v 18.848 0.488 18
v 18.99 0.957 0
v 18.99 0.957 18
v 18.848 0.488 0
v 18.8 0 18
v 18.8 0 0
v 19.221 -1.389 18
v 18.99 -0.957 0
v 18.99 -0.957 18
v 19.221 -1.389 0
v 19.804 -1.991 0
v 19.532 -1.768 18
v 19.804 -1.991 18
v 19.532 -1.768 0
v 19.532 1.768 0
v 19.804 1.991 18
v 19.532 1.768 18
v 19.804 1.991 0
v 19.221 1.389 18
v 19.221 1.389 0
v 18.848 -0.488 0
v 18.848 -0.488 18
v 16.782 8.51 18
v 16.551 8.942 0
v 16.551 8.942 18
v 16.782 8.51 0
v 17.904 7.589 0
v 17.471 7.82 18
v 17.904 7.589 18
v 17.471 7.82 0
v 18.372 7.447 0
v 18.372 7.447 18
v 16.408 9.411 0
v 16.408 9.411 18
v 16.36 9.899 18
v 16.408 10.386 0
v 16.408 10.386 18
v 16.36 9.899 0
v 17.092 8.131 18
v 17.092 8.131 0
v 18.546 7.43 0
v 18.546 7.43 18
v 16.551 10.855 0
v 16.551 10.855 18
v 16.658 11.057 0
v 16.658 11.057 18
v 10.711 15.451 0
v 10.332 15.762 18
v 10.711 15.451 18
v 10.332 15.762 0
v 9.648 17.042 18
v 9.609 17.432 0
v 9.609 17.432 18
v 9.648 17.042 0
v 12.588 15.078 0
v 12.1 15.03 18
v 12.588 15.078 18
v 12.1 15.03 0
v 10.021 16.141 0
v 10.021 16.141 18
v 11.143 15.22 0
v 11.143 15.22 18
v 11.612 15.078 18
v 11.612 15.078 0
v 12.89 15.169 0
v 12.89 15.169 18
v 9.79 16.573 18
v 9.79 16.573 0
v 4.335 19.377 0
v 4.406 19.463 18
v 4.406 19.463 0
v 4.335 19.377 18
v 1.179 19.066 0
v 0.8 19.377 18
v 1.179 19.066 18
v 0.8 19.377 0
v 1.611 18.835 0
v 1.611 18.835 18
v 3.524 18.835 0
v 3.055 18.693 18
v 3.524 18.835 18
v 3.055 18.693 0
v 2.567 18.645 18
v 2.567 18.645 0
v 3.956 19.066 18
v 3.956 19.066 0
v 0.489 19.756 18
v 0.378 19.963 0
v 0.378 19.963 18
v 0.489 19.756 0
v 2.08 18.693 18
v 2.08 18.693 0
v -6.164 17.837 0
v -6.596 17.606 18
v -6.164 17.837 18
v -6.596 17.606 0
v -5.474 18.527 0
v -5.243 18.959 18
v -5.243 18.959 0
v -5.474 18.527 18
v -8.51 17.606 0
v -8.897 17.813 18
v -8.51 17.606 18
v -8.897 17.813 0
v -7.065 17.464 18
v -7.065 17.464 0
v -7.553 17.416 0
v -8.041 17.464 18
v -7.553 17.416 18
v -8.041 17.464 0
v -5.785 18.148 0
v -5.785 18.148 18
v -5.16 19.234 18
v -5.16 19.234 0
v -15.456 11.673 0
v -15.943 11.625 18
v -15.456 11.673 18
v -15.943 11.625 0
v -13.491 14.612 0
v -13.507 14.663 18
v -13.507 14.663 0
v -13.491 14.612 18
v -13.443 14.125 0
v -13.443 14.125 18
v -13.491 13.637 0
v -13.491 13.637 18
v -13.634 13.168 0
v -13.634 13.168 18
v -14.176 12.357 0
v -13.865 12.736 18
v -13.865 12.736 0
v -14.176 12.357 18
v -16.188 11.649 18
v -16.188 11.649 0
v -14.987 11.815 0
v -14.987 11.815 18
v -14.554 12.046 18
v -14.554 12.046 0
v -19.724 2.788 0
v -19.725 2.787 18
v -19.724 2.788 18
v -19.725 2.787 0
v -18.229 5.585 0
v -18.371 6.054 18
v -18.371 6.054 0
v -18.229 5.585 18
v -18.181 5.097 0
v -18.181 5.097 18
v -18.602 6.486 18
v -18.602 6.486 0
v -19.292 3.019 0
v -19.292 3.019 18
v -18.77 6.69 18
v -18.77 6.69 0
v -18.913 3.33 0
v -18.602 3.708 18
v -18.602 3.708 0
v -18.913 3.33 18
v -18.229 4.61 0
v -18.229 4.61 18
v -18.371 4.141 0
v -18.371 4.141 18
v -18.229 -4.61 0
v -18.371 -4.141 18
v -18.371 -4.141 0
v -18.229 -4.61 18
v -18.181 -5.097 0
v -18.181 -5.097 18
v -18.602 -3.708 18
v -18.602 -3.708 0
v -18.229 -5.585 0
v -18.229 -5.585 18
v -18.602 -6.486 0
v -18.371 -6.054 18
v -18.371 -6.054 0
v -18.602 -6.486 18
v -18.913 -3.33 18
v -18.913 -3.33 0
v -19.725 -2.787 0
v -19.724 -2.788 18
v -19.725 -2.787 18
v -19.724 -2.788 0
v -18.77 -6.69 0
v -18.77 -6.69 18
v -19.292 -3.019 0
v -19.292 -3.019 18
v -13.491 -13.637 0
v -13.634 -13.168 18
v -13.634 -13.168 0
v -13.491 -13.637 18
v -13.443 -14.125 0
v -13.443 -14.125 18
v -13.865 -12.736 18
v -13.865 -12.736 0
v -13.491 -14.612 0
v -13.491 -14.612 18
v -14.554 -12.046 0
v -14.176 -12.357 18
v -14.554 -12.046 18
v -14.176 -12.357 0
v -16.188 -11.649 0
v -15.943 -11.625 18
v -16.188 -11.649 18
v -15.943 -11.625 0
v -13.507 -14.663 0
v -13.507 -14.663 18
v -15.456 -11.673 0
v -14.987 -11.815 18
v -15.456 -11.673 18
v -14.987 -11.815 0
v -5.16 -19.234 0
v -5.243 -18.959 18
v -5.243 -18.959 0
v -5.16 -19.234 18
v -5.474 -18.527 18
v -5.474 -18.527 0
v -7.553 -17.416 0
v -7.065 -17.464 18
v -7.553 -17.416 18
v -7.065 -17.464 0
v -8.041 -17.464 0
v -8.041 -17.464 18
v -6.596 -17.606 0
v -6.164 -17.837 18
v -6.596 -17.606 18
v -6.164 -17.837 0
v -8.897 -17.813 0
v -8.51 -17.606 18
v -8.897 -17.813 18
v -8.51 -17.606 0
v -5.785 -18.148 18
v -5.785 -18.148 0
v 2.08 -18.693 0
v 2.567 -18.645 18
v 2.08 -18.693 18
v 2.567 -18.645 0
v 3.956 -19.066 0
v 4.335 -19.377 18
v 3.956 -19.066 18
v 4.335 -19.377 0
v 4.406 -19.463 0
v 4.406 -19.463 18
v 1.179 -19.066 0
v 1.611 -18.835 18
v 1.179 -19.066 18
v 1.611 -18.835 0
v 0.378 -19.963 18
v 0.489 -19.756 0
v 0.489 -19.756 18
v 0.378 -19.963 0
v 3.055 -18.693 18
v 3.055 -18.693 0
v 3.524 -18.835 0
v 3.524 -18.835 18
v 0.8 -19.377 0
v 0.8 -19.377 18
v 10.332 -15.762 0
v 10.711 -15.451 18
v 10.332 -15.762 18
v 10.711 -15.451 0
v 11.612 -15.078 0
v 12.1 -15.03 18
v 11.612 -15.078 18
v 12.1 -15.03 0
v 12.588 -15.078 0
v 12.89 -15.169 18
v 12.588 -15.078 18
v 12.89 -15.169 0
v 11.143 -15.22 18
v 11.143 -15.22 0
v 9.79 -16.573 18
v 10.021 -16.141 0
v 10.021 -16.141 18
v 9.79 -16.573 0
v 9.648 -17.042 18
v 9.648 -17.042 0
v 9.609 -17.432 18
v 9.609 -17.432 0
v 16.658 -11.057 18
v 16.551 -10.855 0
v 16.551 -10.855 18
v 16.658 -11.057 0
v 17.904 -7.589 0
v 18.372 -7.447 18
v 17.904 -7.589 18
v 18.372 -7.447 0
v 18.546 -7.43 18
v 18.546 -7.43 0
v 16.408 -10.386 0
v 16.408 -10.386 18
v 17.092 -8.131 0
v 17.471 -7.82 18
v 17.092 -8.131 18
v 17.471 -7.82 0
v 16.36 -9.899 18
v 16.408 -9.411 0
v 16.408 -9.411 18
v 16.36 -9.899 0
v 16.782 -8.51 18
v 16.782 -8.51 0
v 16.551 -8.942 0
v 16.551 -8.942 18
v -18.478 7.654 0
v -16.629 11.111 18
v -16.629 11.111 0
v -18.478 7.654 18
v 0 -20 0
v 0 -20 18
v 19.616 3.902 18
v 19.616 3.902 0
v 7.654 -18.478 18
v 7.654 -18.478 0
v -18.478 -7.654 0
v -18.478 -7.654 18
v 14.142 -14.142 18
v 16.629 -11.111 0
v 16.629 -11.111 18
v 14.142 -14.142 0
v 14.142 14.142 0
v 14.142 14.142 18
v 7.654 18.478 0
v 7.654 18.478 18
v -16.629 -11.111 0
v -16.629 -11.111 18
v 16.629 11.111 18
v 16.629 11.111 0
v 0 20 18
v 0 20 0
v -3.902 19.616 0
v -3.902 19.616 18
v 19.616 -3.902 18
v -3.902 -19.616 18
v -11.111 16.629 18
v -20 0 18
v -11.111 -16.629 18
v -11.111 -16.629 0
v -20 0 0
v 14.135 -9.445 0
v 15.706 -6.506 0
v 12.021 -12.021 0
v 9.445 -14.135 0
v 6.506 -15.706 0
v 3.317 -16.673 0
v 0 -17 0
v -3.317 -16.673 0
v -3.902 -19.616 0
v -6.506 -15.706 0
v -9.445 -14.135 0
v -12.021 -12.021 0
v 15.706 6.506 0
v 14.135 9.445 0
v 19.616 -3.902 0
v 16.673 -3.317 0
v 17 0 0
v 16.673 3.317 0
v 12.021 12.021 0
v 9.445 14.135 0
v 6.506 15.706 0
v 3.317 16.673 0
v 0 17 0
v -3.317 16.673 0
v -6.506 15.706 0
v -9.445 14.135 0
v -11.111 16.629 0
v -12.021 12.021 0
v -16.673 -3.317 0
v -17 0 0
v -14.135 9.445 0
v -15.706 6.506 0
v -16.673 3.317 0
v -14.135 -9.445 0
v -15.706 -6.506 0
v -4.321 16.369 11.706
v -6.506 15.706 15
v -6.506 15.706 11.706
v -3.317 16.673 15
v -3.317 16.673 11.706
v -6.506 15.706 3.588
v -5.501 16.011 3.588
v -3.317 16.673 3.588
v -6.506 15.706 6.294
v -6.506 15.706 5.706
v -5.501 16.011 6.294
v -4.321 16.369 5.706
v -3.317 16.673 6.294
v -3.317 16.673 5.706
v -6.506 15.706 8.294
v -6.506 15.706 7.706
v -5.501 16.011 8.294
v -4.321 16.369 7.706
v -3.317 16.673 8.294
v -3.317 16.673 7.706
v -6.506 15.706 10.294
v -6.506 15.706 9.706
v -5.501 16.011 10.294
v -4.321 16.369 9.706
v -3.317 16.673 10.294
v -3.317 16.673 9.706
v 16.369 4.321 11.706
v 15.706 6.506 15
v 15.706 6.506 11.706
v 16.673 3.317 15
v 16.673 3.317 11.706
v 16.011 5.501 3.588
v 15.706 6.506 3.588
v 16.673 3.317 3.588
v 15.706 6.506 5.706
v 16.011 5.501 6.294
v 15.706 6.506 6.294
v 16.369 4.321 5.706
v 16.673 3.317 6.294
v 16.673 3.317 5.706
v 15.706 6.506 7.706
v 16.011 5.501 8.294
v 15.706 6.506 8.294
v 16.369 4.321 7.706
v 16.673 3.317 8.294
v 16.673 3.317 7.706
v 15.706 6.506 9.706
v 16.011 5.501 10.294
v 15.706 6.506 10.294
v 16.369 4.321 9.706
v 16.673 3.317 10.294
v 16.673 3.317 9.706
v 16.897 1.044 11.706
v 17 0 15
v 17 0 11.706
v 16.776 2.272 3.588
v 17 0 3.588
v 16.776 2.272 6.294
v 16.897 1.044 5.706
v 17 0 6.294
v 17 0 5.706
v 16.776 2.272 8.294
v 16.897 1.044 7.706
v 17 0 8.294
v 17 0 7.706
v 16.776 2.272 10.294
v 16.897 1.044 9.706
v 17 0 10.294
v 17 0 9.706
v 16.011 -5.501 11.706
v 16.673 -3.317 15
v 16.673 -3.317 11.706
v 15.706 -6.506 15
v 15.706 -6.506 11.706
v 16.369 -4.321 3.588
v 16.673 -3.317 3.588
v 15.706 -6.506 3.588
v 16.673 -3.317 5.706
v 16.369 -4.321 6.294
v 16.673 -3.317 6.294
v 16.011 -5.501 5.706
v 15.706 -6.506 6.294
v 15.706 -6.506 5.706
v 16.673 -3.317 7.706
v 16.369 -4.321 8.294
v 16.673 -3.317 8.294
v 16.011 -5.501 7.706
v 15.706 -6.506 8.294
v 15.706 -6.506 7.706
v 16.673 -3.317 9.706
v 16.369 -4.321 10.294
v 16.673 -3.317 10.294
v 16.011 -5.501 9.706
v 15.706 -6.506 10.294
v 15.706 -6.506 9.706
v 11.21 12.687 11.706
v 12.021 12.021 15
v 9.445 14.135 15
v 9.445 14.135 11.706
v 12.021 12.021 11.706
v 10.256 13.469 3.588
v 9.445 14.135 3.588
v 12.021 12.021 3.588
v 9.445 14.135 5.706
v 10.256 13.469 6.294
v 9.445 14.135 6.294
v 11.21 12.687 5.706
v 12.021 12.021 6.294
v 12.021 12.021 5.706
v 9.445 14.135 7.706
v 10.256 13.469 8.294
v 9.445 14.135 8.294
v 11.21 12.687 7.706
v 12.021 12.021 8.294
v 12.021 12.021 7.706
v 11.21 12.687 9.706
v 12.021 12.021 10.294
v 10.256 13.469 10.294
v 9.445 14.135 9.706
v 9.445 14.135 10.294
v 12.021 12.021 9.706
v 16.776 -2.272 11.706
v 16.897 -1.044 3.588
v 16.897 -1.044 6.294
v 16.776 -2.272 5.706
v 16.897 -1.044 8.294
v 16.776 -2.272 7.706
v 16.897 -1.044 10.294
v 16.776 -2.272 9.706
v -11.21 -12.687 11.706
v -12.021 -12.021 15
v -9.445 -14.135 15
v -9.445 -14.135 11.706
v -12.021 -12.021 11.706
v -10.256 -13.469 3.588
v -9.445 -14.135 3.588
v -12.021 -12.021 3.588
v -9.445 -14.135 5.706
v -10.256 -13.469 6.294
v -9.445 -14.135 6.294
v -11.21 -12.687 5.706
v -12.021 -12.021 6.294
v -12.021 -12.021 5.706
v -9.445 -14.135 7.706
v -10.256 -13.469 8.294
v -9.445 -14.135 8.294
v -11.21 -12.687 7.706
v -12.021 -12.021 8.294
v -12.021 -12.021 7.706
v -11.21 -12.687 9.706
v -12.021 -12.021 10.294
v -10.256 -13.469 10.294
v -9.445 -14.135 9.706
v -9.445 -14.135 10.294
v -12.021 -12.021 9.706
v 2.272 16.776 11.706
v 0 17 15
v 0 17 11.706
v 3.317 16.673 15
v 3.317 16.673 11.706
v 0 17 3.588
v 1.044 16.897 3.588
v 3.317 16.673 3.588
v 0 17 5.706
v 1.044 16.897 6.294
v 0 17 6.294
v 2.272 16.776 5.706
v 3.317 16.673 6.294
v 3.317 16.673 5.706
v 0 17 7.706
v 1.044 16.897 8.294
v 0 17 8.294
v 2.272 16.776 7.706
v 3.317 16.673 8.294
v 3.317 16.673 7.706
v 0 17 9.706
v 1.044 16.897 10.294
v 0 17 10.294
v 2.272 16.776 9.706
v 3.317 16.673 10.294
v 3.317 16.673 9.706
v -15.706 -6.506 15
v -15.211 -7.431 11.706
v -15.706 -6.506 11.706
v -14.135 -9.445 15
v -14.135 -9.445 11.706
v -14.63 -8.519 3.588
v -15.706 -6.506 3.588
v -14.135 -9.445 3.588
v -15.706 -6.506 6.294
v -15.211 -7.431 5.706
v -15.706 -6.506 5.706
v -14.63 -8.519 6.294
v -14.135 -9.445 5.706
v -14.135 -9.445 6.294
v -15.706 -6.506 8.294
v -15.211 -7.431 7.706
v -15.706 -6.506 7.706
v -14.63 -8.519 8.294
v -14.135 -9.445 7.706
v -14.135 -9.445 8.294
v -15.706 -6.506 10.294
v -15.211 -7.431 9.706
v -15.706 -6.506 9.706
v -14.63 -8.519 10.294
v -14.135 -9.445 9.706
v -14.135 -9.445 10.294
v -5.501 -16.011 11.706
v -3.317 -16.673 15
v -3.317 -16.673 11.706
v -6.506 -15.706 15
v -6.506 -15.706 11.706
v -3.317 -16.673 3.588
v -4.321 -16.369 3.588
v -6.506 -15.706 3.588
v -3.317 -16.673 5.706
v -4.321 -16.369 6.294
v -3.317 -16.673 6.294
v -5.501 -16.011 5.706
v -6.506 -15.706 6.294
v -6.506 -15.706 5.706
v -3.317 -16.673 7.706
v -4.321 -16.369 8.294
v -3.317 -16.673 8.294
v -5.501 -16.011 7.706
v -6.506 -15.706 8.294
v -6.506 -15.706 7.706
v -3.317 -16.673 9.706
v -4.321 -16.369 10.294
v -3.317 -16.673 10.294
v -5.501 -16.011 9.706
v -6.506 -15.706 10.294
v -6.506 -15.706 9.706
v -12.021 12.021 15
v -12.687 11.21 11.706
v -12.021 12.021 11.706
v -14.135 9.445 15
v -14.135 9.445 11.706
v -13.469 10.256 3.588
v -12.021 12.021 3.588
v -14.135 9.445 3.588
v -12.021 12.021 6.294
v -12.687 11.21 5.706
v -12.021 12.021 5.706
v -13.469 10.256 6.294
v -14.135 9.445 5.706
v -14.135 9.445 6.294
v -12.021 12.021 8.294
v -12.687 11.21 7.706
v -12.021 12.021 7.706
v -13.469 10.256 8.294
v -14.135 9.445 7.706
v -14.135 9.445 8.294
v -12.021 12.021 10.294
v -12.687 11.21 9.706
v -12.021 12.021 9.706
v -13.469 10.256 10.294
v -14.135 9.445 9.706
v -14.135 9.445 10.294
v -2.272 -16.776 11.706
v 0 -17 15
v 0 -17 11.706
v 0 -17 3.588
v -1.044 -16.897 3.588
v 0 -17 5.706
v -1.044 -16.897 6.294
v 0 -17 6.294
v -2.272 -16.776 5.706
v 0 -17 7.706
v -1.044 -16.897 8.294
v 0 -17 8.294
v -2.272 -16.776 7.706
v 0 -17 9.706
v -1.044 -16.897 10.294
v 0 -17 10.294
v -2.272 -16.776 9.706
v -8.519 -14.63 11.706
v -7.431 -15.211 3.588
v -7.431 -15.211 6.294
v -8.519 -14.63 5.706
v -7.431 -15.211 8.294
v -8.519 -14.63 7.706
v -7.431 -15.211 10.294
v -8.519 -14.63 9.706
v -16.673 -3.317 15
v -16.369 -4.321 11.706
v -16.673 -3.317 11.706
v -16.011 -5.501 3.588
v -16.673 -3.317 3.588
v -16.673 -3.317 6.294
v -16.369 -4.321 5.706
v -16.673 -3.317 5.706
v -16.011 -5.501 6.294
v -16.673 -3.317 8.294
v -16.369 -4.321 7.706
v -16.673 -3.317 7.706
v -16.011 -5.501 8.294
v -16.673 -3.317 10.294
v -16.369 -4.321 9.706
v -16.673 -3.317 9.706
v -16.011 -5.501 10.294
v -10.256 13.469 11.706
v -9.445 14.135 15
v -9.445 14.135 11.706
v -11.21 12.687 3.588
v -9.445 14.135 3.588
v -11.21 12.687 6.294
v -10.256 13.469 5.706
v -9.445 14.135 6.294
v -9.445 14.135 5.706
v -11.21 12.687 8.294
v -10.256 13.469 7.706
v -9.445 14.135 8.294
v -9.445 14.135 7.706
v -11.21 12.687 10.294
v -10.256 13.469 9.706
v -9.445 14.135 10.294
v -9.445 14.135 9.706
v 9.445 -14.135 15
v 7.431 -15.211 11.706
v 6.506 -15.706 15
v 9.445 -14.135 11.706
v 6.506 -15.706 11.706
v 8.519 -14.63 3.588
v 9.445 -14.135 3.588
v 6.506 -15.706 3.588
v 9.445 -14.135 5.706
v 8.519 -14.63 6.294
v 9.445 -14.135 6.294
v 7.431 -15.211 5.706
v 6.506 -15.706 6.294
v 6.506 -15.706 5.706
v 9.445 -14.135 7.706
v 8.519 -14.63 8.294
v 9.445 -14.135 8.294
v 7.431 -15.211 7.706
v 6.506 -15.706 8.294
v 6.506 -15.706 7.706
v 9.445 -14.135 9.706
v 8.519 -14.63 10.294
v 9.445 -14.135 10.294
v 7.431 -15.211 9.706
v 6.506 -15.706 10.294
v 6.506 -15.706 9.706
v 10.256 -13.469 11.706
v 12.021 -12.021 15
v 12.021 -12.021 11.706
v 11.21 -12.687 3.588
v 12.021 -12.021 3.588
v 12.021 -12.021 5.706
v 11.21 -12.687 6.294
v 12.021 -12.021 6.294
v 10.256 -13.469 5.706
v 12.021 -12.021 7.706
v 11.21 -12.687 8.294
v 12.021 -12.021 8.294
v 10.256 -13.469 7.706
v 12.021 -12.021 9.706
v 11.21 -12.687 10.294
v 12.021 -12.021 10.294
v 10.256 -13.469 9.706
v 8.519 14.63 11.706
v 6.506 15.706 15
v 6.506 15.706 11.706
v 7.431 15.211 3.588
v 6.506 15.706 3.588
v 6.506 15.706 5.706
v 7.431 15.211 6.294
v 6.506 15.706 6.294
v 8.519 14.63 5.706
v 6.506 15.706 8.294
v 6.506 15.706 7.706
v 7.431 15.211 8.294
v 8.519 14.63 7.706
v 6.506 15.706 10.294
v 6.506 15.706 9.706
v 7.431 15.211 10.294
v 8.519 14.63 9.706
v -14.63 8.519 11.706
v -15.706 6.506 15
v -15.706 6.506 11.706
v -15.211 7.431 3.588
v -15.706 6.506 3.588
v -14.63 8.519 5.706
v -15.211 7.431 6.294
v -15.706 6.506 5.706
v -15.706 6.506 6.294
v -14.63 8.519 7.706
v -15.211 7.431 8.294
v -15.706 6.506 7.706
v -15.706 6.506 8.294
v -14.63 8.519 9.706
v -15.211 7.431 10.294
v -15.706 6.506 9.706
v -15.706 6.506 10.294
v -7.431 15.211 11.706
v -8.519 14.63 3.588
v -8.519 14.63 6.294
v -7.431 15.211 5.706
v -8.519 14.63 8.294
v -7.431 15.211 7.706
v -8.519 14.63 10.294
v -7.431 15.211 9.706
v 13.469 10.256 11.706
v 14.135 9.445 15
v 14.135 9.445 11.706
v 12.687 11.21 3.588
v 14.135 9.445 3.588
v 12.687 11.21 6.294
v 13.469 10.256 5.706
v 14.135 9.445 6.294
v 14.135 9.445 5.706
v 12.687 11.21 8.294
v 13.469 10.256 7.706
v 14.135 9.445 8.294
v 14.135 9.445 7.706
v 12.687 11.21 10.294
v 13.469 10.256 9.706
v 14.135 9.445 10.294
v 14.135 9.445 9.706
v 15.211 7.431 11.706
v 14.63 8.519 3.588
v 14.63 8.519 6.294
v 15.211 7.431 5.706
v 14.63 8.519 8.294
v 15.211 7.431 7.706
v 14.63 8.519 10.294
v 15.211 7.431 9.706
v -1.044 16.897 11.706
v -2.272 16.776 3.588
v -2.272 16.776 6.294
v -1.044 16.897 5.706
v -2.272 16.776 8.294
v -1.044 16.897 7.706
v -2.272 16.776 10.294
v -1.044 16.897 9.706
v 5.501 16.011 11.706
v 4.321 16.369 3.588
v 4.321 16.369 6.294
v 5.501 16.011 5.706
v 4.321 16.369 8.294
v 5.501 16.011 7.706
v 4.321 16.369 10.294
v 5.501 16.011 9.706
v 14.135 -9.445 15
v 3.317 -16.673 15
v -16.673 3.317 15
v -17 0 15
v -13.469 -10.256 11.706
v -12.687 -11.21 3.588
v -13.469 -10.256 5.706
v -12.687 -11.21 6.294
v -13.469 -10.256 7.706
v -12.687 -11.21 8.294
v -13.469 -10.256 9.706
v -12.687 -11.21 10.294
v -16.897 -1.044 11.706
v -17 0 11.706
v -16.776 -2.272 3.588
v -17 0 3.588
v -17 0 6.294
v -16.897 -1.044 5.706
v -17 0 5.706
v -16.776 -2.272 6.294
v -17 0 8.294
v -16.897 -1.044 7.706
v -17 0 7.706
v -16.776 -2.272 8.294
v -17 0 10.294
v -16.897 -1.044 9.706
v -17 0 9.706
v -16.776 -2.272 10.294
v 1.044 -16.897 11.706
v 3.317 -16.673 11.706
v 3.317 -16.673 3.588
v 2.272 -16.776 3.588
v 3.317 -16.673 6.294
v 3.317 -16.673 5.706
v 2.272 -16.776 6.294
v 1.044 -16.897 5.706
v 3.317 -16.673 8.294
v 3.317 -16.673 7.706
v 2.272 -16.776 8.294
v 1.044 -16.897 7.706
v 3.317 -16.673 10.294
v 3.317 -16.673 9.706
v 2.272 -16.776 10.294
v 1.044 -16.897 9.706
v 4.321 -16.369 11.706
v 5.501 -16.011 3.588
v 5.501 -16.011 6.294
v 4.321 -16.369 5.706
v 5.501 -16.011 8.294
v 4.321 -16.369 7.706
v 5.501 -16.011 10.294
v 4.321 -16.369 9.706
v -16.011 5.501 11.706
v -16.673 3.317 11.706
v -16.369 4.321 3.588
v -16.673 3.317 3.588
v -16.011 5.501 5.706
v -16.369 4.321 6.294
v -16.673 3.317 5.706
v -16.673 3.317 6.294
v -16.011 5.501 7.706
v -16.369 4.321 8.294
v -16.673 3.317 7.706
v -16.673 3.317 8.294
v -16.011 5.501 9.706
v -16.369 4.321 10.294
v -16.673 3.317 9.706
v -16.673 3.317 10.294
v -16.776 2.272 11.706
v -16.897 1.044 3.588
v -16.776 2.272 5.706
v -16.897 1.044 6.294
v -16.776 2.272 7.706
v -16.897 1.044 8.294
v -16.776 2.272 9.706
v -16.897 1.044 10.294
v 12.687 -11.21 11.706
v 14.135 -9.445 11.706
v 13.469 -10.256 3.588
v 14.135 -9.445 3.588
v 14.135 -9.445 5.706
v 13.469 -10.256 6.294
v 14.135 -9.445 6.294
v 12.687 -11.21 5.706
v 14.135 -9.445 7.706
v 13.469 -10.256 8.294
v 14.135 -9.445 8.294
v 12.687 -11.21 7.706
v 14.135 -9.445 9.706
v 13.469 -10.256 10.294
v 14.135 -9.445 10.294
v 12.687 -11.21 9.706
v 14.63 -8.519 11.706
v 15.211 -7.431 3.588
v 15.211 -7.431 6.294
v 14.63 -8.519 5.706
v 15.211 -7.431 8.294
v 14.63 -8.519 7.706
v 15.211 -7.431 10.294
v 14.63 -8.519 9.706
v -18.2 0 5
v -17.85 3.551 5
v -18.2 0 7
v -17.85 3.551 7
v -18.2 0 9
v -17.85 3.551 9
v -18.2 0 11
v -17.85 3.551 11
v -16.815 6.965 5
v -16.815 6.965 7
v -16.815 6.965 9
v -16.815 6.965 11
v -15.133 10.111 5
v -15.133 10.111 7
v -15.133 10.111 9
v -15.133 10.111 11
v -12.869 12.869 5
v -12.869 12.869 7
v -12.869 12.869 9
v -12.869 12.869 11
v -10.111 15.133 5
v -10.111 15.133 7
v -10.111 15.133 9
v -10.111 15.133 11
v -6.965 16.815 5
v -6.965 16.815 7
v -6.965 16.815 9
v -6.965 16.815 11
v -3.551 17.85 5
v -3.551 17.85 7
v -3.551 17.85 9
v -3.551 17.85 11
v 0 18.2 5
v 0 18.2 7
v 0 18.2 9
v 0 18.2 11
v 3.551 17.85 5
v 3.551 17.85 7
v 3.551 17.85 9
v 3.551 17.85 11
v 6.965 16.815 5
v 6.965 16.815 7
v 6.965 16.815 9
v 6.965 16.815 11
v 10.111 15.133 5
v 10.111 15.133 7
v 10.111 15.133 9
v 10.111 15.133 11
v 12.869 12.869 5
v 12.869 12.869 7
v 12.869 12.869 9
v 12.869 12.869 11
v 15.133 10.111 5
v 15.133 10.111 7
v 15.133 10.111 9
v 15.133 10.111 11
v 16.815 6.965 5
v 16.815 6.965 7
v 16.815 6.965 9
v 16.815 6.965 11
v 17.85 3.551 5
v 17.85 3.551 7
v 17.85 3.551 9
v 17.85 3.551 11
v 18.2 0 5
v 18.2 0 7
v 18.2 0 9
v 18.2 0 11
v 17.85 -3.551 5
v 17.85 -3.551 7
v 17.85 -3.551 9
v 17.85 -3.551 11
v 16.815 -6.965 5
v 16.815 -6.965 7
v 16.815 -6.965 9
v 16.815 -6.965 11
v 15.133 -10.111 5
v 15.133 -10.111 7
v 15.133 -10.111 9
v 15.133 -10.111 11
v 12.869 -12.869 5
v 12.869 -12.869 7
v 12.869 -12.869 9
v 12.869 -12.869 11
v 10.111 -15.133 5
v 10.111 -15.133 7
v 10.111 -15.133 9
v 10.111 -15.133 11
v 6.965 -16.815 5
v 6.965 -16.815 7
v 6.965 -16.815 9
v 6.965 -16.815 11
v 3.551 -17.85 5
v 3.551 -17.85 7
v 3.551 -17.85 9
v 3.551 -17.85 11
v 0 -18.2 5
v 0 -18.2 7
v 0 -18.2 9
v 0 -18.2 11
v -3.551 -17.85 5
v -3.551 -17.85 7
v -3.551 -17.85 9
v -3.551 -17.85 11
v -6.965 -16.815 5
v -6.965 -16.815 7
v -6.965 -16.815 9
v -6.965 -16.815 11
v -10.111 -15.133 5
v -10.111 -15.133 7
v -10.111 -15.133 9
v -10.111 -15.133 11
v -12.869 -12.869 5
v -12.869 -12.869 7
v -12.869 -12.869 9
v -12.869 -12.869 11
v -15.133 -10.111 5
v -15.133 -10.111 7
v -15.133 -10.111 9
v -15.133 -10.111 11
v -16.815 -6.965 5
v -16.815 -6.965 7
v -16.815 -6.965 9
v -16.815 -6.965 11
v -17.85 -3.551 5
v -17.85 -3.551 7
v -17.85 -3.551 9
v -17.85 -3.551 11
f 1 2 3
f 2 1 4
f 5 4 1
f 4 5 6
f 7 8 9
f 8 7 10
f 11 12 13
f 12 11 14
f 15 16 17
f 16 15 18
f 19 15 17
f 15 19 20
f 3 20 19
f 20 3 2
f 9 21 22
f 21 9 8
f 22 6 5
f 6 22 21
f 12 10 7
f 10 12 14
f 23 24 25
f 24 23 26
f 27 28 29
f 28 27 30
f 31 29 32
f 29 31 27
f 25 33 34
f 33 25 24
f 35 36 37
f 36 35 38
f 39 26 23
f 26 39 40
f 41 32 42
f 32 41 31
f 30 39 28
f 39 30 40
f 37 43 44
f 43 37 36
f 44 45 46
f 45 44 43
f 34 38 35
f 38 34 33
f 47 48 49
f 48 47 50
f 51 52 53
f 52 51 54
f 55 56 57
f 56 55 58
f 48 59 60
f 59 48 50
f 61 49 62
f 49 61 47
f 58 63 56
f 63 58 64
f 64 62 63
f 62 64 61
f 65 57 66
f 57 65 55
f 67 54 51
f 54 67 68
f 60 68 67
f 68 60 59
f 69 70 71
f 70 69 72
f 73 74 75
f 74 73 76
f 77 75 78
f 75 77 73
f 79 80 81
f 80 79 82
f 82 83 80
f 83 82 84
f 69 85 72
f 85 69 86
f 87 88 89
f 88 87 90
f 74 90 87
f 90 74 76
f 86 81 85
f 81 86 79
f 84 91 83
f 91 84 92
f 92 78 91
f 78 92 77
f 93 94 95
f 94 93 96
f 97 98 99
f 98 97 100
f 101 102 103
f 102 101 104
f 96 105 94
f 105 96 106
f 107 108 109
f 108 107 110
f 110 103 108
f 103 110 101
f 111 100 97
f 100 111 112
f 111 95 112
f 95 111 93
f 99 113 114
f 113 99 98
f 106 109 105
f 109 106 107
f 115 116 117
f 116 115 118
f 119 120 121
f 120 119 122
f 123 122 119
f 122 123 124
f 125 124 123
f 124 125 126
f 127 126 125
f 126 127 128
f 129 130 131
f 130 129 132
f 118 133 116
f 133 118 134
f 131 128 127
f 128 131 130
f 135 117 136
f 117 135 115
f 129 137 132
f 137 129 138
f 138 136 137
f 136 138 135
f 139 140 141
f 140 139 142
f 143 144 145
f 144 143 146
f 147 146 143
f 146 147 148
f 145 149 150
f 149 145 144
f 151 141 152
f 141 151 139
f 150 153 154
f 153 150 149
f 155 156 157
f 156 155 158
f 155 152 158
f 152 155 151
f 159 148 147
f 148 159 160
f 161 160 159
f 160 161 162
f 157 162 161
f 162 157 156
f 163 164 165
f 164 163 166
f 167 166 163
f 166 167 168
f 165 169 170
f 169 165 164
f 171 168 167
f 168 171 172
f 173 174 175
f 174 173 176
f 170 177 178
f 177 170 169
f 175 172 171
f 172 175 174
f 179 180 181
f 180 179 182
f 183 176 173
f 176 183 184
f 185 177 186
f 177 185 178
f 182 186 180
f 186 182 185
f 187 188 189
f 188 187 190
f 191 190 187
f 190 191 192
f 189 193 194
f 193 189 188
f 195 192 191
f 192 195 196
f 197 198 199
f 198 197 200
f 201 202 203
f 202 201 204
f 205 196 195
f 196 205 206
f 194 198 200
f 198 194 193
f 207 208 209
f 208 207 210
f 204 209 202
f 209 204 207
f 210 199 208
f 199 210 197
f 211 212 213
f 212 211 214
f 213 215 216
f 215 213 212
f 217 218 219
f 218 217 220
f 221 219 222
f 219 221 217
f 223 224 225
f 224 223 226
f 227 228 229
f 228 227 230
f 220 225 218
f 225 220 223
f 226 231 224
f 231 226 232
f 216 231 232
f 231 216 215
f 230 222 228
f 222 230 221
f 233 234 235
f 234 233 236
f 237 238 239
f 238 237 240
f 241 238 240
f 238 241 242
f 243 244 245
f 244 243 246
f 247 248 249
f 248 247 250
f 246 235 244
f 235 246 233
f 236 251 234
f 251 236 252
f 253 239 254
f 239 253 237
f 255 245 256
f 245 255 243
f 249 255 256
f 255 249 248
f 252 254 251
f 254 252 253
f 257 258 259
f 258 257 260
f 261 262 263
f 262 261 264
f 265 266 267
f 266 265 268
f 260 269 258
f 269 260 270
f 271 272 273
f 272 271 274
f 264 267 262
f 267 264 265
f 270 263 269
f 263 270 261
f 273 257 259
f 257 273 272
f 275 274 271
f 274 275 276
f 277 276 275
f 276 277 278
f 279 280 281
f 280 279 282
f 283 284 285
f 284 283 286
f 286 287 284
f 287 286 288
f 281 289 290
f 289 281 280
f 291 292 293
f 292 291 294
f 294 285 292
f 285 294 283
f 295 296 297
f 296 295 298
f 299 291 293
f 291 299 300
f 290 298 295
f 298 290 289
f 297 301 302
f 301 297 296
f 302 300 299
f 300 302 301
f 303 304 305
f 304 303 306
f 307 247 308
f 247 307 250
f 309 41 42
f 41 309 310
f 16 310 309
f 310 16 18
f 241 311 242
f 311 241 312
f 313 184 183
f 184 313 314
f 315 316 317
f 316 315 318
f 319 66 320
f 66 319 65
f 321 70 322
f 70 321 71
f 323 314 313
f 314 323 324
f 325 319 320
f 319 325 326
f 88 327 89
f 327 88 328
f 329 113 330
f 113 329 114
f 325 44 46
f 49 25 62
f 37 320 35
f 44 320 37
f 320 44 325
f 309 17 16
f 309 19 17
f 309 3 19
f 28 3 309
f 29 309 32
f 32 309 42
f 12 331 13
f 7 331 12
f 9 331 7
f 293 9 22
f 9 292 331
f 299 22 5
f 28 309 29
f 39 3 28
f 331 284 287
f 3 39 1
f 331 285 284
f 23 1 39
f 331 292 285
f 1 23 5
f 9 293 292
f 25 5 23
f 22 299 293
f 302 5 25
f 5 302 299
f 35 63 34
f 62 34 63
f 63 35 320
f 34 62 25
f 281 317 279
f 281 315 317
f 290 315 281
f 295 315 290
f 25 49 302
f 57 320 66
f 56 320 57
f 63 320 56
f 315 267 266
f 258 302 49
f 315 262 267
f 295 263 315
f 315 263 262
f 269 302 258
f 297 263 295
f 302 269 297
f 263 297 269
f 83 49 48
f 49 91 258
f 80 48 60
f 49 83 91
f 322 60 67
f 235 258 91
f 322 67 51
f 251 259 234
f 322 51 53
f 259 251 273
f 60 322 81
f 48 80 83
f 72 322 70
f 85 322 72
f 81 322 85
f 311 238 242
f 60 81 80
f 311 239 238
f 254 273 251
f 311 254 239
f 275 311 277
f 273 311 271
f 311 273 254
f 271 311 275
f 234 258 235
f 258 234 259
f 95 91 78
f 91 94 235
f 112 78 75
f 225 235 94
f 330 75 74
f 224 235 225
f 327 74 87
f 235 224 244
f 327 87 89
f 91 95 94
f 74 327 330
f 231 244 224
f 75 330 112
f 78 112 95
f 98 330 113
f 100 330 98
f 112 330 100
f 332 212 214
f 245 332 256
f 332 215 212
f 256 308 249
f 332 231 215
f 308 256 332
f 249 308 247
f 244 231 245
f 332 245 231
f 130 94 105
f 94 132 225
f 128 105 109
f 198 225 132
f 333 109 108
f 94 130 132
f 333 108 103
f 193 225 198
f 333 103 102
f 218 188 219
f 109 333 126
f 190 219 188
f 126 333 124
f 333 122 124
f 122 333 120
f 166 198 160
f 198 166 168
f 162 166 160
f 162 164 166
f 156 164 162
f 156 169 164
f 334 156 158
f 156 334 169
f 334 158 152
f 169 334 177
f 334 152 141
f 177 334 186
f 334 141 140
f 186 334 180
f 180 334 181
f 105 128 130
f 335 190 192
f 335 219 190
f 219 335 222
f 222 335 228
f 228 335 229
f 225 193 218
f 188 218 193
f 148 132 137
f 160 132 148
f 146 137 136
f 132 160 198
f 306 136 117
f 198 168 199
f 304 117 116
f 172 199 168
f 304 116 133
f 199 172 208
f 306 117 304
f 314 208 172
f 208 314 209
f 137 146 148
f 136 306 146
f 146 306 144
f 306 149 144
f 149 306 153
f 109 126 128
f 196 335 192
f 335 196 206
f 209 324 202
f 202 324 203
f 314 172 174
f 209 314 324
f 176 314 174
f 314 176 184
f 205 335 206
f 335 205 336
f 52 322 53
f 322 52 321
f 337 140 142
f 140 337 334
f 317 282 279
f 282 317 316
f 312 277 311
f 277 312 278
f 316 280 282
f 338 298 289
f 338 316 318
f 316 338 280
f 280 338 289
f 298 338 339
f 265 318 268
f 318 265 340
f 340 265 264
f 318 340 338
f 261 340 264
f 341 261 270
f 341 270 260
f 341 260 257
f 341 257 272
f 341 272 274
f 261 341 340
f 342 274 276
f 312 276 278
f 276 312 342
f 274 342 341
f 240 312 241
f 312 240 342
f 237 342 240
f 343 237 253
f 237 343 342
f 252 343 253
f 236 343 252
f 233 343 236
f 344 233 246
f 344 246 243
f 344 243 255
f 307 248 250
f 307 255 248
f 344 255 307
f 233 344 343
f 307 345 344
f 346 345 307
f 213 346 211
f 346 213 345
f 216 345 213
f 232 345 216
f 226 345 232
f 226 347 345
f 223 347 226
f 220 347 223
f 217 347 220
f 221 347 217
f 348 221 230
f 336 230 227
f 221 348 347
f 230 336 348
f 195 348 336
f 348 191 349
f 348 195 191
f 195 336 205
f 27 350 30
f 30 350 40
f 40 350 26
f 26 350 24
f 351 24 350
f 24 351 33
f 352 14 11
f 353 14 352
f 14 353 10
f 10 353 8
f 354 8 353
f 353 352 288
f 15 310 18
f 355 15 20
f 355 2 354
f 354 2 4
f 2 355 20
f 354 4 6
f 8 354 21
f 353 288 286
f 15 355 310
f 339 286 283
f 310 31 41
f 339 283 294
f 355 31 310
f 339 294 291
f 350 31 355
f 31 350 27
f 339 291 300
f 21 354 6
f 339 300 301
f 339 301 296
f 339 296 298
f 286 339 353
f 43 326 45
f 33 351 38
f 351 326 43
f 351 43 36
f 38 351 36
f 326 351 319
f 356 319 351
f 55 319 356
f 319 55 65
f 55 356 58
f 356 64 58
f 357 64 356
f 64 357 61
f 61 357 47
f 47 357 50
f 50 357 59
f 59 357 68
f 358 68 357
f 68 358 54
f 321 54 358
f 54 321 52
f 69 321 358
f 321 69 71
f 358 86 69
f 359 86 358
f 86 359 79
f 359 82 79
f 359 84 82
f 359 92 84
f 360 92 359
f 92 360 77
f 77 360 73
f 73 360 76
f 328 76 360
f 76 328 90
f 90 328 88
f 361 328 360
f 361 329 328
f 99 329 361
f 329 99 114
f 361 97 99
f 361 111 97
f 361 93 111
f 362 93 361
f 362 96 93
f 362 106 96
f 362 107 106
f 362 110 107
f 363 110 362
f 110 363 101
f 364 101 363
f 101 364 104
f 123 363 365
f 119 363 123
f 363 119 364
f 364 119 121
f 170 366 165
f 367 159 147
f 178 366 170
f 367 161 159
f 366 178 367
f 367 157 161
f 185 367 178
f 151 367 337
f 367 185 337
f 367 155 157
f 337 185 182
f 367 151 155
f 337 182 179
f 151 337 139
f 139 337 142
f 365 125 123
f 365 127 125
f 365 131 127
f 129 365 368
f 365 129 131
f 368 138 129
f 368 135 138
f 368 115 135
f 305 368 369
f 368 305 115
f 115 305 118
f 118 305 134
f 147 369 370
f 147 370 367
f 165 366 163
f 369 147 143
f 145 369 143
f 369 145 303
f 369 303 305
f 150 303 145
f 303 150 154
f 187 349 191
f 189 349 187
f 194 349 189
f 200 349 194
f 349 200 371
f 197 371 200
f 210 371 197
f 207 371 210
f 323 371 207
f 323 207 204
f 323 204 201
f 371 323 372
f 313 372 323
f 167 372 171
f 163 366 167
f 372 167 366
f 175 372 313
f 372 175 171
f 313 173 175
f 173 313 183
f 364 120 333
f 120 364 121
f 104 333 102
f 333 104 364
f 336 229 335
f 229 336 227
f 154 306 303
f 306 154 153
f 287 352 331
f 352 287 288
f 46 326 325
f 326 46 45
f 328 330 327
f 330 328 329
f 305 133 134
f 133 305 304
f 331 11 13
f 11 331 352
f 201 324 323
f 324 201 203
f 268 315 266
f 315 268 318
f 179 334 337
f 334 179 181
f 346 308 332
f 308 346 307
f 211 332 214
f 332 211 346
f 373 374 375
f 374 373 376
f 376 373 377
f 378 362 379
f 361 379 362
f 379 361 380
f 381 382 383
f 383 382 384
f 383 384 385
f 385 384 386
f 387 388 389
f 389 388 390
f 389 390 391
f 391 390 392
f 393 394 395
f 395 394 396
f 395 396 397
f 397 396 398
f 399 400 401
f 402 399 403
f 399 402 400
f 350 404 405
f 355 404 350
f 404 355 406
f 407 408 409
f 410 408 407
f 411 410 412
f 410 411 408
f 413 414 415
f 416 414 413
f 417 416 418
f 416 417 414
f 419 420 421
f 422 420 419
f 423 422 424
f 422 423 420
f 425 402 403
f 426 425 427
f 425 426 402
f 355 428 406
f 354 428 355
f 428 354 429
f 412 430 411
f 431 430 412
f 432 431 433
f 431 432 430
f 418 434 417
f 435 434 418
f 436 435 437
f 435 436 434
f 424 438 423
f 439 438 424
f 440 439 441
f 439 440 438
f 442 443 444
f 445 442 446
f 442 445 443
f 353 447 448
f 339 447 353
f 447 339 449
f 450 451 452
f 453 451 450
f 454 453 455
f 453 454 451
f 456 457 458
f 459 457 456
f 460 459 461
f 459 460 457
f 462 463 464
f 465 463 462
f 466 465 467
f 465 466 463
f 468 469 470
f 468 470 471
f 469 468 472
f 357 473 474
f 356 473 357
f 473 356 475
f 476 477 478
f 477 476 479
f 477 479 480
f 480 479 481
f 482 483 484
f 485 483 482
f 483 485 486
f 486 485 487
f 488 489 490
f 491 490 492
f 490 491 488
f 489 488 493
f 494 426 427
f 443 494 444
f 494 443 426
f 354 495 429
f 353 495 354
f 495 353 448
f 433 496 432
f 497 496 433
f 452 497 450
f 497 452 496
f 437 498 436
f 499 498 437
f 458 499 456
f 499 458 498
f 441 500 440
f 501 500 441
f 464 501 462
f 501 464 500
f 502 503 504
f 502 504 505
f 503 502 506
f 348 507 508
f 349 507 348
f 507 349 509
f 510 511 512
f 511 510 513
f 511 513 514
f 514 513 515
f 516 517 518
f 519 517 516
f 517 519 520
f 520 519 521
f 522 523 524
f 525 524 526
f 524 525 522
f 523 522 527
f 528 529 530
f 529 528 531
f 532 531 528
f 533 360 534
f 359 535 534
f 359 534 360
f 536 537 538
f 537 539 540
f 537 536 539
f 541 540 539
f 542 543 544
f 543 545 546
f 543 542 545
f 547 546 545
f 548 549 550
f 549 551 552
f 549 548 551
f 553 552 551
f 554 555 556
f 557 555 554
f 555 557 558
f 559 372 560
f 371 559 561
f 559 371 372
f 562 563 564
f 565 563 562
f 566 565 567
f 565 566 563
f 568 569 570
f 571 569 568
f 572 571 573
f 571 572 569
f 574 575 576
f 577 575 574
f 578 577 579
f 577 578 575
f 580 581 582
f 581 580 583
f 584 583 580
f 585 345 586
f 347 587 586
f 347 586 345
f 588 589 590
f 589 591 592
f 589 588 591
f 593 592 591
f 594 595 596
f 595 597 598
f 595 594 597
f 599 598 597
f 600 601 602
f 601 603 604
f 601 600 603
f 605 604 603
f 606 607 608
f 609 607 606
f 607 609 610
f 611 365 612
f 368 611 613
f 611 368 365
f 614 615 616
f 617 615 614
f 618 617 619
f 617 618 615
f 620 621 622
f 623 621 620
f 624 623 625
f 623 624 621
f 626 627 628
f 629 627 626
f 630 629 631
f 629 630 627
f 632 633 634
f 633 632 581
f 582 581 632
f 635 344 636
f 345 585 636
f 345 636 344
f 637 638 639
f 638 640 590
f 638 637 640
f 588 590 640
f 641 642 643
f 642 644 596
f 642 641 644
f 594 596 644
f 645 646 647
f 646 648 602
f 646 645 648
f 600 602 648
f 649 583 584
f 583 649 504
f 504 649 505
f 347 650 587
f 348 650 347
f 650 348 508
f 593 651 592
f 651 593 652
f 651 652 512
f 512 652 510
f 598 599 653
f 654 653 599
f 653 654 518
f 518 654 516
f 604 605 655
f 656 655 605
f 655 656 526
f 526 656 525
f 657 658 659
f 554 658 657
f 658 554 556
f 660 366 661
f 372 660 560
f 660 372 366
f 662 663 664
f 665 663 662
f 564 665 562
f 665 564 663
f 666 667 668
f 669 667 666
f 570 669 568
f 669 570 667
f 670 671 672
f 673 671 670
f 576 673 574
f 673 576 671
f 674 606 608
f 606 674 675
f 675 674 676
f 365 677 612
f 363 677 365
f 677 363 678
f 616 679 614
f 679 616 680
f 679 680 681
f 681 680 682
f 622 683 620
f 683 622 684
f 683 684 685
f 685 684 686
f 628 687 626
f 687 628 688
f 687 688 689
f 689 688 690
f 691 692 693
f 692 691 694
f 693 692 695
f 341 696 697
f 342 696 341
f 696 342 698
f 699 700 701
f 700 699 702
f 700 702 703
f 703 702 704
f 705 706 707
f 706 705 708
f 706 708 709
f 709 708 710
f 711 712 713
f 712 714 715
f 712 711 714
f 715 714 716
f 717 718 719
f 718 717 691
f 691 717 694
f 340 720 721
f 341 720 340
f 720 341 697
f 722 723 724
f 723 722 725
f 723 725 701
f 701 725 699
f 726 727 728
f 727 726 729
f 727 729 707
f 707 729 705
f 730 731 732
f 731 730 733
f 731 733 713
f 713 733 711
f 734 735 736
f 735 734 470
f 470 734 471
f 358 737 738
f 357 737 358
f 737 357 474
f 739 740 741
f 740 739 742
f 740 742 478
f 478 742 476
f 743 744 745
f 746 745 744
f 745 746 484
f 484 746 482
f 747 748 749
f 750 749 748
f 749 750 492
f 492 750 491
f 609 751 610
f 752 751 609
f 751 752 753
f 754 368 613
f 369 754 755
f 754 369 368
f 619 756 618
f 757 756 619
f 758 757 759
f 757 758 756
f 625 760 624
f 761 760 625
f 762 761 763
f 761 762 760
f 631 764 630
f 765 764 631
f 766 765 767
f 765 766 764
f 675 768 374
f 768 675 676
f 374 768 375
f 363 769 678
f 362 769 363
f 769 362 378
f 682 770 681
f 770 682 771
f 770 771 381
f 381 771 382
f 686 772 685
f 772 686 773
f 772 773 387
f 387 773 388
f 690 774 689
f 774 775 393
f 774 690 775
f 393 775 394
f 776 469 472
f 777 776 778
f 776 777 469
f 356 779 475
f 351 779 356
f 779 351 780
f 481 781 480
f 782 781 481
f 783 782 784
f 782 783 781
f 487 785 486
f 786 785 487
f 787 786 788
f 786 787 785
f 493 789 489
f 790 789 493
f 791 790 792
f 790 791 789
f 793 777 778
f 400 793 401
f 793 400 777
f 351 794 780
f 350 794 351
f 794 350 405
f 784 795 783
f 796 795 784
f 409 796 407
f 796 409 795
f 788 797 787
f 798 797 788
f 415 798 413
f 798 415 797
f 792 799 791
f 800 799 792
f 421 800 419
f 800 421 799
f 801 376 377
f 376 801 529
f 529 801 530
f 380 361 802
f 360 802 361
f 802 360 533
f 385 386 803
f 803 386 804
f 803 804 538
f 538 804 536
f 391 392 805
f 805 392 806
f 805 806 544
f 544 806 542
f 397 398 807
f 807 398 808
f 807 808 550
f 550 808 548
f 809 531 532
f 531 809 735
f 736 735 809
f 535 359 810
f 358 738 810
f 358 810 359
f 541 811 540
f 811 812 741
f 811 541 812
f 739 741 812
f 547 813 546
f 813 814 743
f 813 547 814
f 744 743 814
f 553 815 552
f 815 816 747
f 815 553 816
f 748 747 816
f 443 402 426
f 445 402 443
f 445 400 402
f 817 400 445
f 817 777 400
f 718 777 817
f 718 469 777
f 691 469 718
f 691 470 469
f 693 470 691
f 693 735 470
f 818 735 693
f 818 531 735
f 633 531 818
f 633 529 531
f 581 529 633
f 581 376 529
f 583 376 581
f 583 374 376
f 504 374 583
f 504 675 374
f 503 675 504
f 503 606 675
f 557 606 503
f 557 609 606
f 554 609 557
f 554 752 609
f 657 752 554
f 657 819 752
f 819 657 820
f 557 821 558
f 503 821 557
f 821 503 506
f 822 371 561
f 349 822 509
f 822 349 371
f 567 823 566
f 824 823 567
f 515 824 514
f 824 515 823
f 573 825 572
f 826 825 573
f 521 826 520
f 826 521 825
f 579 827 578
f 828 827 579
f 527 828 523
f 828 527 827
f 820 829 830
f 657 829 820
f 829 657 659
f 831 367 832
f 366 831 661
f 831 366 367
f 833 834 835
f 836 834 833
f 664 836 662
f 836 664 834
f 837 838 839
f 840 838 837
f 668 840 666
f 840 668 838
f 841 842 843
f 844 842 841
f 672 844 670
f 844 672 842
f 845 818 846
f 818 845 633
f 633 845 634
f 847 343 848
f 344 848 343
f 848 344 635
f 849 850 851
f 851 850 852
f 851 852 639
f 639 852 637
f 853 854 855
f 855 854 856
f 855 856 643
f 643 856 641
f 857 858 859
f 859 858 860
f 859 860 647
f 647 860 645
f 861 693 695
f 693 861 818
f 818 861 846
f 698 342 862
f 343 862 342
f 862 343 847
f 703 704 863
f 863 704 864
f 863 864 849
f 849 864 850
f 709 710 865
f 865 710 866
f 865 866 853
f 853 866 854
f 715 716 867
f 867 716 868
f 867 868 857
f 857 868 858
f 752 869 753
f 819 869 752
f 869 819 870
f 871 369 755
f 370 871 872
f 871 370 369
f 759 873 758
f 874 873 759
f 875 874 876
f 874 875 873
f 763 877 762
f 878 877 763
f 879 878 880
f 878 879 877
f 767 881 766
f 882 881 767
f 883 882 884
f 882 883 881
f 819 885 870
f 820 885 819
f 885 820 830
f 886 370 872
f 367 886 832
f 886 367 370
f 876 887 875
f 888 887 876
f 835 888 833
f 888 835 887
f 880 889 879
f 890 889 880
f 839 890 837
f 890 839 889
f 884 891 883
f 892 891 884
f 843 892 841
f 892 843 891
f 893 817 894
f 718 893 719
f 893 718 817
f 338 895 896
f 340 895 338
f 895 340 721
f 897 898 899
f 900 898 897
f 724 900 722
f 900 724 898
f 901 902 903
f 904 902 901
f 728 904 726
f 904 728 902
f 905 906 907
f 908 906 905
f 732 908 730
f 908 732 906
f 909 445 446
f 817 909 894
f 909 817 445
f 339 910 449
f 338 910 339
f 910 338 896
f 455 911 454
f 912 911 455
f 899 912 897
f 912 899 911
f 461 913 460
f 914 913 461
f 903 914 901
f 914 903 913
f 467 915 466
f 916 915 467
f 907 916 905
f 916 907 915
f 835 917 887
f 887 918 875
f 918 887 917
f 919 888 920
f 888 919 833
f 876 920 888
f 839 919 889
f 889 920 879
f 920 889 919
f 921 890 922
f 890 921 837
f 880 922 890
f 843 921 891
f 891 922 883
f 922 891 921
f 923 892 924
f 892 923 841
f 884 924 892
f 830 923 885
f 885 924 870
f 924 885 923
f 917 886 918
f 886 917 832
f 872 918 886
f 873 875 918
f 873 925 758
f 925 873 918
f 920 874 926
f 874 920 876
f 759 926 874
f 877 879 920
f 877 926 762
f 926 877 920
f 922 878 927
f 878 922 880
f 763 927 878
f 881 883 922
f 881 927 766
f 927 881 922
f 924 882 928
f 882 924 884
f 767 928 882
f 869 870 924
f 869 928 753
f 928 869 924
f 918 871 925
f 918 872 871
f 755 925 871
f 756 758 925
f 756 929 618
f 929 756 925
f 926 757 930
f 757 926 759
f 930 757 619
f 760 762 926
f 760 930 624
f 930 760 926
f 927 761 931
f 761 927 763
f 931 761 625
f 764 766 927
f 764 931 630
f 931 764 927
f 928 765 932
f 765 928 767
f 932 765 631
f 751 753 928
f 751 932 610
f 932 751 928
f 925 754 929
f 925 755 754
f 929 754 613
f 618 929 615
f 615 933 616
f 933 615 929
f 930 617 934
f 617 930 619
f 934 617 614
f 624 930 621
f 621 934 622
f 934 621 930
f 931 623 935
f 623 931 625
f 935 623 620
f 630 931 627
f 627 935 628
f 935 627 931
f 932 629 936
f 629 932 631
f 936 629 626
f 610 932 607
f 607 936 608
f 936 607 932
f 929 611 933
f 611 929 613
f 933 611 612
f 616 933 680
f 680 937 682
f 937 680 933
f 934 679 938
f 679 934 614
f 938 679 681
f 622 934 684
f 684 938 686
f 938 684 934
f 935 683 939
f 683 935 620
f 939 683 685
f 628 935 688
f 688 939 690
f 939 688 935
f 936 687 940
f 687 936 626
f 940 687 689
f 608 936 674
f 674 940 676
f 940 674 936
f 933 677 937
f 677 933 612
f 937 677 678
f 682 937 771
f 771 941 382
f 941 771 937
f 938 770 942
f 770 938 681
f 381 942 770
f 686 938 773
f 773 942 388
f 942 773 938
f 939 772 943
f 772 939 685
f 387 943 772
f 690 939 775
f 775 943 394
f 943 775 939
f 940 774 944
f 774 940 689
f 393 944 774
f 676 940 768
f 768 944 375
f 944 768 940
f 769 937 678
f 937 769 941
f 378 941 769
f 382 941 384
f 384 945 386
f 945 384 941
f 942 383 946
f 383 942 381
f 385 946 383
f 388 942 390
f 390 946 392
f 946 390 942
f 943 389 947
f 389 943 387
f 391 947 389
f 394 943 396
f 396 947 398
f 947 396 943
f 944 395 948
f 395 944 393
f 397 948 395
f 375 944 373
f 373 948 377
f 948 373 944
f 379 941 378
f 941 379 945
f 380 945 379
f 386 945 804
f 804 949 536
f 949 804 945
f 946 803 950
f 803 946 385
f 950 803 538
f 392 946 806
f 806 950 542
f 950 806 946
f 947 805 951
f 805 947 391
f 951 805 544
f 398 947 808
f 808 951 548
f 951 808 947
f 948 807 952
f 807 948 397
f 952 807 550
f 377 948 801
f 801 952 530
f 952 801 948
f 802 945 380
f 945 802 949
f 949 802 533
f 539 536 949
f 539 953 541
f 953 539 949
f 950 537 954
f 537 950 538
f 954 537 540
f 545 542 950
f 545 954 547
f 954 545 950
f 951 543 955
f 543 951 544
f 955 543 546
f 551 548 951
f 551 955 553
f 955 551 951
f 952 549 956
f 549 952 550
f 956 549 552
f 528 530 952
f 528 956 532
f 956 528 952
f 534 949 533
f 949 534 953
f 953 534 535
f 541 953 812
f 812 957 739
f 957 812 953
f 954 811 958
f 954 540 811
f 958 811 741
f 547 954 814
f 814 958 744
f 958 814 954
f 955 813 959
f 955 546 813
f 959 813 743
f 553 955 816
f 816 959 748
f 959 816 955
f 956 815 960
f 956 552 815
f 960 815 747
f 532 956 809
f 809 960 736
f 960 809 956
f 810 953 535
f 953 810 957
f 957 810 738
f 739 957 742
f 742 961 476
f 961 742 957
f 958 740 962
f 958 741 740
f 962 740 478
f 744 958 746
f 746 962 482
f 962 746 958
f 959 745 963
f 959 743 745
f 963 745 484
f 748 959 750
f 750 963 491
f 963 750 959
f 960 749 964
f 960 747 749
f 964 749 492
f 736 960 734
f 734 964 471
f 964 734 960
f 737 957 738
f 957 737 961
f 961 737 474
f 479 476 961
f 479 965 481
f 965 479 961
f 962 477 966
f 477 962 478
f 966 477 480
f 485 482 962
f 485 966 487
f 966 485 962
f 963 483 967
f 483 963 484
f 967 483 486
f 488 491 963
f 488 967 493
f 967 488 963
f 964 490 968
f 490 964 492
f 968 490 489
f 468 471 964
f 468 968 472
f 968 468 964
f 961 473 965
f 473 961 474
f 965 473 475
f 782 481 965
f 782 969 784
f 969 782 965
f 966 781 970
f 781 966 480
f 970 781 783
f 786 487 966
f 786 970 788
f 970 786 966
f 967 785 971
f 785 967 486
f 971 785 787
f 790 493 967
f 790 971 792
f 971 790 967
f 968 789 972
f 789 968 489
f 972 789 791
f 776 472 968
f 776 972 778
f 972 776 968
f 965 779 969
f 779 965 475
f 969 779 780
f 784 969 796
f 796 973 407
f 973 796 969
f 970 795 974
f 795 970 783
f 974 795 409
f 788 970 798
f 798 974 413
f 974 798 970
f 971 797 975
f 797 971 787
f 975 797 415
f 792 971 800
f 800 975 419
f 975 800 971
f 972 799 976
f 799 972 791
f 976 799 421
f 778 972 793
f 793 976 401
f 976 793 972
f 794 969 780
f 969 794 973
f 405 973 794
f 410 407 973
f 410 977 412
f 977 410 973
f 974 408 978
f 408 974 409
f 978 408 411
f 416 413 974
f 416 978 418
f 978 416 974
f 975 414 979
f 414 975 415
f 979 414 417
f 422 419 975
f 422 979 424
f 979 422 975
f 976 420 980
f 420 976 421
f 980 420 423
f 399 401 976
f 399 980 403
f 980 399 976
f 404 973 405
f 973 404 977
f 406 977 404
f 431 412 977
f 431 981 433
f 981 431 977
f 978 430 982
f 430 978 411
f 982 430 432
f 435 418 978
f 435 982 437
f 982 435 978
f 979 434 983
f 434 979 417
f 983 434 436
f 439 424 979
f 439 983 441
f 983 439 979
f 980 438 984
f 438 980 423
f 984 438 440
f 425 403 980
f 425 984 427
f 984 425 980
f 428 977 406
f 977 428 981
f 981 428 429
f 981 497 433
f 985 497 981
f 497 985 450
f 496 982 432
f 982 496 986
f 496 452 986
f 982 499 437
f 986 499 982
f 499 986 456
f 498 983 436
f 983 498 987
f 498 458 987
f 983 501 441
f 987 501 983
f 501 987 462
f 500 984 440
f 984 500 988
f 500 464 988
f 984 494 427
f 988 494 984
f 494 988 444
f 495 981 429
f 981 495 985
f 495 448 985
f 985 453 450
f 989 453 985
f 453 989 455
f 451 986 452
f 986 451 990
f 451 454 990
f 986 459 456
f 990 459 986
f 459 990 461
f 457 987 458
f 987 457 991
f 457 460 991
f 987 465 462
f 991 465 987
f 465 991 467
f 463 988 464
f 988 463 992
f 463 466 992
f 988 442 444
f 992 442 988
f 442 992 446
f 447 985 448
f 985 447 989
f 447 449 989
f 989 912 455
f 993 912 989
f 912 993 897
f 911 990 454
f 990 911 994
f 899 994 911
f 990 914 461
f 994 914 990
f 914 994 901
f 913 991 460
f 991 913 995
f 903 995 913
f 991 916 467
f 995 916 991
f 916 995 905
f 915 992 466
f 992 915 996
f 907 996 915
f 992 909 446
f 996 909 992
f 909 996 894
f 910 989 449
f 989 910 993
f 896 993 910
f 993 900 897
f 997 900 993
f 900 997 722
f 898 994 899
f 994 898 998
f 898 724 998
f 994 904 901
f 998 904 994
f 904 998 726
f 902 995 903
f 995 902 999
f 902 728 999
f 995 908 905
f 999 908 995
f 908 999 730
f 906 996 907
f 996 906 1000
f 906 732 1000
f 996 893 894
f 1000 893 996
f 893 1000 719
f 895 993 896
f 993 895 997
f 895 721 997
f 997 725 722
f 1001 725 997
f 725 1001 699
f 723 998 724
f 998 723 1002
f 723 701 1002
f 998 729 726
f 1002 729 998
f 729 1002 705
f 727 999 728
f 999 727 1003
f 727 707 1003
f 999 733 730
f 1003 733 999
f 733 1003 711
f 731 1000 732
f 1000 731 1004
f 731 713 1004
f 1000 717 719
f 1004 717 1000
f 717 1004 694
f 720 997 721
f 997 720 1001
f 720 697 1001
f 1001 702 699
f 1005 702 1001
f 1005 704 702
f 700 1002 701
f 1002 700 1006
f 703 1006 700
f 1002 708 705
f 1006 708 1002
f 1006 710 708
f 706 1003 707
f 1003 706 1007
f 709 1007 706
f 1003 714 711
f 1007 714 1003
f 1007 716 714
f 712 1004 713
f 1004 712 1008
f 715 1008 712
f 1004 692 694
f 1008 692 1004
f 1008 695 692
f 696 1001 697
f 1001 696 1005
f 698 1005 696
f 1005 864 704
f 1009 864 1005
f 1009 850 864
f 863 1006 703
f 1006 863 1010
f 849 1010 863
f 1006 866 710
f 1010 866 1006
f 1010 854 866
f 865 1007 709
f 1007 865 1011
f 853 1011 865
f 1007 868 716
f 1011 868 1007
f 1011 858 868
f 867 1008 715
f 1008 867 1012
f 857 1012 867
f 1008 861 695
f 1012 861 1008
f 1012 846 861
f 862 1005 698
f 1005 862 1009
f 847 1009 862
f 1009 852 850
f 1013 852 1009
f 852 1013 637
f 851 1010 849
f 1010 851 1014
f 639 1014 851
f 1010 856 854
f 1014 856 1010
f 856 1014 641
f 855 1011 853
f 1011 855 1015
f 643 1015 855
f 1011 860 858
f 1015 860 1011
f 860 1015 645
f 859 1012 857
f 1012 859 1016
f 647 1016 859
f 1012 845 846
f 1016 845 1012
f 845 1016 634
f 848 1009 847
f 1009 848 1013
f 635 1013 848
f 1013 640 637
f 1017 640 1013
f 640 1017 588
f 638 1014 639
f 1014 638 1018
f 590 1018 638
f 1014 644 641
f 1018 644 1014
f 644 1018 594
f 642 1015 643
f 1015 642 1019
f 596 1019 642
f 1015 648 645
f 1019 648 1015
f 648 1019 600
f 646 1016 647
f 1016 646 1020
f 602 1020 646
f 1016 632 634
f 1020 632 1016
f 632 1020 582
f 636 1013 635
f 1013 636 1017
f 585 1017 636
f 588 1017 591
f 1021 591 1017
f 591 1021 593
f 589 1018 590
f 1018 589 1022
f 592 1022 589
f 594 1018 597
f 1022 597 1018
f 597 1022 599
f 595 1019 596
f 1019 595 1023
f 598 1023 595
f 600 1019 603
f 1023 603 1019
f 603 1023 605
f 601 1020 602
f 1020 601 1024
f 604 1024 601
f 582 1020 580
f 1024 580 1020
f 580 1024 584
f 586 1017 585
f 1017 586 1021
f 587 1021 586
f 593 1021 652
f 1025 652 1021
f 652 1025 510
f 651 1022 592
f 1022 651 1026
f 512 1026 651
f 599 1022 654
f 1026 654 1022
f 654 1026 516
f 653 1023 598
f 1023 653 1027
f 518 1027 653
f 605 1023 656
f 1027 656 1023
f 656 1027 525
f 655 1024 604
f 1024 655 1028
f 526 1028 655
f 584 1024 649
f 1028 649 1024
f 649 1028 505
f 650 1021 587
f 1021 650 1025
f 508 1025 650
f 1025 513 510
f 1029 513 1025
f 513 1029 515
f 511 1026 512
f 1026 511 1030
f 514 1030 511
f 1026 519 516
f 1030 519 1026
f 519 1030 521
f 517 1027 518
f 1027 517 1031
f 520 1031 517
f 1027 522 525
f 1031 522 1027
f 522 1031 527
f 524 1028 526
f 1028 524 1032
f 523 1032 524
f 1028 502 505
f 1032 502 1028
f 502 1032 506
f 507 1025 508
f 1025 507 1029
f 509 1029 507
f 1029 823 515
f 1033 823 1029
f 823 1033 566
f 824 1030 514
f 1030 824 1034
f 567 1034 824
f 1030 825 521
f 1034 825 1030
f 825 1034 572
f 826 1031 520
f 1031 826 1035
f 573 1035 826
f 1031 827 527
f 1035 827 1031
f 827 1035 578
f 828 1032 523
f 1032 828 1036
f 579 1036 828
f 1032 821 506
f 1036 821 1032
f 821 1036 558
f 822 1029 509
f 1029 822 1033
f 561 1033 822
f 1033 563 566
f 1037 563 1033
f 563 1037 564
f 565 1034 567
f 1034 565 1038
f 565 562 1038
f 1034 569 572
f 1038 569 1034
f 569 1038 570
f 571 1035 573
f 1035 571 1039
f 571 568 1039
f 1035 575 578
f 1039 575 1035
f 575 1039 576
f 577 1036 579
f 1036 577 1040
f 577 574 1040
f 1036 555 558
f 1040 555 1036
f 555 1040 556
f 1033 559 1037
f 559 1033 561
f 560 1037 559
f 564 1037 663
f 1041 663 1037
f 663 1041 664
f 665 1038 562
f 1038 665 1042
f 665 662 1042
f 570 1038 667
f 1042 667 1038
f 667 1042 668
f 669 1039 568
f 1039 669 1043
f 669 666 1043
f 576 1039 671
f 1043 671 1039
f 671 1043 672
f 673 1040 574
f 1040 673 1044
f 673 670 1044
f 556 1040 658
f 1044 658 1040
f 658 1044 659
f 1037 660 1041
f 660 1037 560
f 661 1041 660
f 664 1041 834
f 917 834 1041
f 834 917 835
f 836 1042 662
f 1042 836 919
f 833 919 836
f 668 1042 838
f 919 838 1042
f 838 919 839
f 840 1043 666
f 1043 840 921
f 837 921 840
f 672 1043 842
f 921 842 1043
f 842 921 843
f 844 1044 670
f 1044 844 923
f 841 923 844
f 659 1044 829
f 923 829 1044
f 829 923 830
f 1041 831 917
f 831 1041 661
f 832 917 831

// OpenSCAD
$fn = 32;

// ----------------------------------------------------------------------
// Threaded cap: 40 mm body, 18 mm tall, 34 mm threaded bore
// ----------------------------------------------------------------------

// --- parameters (mm) ---
outer_d = 40;             // cap outside diameter
body_h = 18;              // cap height
top_t = 3;                // closed top thickness
bore_d = 34;              // bore core diameter
pitch = 2;                // thread pitch
thread_d = 1.2;           // thread depth
thread_z = 3;             // thread start above the rim
thread_h = 9;             // threaded height
flutes = 13;              // number of knurl flutes
flute_d = 5;              // flute cutter diameter
flute_depth = 1.2;        // flute depth into the rim

difference() {
  union() {
    cylinder(h = 18, d = outer_d);
  }
  /* threaded bore, closed at the top */
  translate([0, 0, -2.5]) cylinder(h = 17.5, d = bore_d);
  translate([0, 0, 3]) rotate_extrude() polygon([[16, 0], [16, 9], [16.5, 9], [18.2, 8], [16.5, 7], [18.2, 6], [16.5, 5], [18.2, 4], [16.5, 3], [18.2, 2], [16.5, 0], [16, 0]]);
  /* knurl flutes around the rim */
  for (i = [0 : flutes - 1]) {
    a = i * 360 / flutes;
    translate([(outer_d / 2 + flute_d / 2 - flute_depth) * cos(a), (outer_d / 2 + flute_d / 2 - flute_depth) * sin(a), -2.5]) cylinder(h = body_h + 5, d = flute_d);
  }
}
